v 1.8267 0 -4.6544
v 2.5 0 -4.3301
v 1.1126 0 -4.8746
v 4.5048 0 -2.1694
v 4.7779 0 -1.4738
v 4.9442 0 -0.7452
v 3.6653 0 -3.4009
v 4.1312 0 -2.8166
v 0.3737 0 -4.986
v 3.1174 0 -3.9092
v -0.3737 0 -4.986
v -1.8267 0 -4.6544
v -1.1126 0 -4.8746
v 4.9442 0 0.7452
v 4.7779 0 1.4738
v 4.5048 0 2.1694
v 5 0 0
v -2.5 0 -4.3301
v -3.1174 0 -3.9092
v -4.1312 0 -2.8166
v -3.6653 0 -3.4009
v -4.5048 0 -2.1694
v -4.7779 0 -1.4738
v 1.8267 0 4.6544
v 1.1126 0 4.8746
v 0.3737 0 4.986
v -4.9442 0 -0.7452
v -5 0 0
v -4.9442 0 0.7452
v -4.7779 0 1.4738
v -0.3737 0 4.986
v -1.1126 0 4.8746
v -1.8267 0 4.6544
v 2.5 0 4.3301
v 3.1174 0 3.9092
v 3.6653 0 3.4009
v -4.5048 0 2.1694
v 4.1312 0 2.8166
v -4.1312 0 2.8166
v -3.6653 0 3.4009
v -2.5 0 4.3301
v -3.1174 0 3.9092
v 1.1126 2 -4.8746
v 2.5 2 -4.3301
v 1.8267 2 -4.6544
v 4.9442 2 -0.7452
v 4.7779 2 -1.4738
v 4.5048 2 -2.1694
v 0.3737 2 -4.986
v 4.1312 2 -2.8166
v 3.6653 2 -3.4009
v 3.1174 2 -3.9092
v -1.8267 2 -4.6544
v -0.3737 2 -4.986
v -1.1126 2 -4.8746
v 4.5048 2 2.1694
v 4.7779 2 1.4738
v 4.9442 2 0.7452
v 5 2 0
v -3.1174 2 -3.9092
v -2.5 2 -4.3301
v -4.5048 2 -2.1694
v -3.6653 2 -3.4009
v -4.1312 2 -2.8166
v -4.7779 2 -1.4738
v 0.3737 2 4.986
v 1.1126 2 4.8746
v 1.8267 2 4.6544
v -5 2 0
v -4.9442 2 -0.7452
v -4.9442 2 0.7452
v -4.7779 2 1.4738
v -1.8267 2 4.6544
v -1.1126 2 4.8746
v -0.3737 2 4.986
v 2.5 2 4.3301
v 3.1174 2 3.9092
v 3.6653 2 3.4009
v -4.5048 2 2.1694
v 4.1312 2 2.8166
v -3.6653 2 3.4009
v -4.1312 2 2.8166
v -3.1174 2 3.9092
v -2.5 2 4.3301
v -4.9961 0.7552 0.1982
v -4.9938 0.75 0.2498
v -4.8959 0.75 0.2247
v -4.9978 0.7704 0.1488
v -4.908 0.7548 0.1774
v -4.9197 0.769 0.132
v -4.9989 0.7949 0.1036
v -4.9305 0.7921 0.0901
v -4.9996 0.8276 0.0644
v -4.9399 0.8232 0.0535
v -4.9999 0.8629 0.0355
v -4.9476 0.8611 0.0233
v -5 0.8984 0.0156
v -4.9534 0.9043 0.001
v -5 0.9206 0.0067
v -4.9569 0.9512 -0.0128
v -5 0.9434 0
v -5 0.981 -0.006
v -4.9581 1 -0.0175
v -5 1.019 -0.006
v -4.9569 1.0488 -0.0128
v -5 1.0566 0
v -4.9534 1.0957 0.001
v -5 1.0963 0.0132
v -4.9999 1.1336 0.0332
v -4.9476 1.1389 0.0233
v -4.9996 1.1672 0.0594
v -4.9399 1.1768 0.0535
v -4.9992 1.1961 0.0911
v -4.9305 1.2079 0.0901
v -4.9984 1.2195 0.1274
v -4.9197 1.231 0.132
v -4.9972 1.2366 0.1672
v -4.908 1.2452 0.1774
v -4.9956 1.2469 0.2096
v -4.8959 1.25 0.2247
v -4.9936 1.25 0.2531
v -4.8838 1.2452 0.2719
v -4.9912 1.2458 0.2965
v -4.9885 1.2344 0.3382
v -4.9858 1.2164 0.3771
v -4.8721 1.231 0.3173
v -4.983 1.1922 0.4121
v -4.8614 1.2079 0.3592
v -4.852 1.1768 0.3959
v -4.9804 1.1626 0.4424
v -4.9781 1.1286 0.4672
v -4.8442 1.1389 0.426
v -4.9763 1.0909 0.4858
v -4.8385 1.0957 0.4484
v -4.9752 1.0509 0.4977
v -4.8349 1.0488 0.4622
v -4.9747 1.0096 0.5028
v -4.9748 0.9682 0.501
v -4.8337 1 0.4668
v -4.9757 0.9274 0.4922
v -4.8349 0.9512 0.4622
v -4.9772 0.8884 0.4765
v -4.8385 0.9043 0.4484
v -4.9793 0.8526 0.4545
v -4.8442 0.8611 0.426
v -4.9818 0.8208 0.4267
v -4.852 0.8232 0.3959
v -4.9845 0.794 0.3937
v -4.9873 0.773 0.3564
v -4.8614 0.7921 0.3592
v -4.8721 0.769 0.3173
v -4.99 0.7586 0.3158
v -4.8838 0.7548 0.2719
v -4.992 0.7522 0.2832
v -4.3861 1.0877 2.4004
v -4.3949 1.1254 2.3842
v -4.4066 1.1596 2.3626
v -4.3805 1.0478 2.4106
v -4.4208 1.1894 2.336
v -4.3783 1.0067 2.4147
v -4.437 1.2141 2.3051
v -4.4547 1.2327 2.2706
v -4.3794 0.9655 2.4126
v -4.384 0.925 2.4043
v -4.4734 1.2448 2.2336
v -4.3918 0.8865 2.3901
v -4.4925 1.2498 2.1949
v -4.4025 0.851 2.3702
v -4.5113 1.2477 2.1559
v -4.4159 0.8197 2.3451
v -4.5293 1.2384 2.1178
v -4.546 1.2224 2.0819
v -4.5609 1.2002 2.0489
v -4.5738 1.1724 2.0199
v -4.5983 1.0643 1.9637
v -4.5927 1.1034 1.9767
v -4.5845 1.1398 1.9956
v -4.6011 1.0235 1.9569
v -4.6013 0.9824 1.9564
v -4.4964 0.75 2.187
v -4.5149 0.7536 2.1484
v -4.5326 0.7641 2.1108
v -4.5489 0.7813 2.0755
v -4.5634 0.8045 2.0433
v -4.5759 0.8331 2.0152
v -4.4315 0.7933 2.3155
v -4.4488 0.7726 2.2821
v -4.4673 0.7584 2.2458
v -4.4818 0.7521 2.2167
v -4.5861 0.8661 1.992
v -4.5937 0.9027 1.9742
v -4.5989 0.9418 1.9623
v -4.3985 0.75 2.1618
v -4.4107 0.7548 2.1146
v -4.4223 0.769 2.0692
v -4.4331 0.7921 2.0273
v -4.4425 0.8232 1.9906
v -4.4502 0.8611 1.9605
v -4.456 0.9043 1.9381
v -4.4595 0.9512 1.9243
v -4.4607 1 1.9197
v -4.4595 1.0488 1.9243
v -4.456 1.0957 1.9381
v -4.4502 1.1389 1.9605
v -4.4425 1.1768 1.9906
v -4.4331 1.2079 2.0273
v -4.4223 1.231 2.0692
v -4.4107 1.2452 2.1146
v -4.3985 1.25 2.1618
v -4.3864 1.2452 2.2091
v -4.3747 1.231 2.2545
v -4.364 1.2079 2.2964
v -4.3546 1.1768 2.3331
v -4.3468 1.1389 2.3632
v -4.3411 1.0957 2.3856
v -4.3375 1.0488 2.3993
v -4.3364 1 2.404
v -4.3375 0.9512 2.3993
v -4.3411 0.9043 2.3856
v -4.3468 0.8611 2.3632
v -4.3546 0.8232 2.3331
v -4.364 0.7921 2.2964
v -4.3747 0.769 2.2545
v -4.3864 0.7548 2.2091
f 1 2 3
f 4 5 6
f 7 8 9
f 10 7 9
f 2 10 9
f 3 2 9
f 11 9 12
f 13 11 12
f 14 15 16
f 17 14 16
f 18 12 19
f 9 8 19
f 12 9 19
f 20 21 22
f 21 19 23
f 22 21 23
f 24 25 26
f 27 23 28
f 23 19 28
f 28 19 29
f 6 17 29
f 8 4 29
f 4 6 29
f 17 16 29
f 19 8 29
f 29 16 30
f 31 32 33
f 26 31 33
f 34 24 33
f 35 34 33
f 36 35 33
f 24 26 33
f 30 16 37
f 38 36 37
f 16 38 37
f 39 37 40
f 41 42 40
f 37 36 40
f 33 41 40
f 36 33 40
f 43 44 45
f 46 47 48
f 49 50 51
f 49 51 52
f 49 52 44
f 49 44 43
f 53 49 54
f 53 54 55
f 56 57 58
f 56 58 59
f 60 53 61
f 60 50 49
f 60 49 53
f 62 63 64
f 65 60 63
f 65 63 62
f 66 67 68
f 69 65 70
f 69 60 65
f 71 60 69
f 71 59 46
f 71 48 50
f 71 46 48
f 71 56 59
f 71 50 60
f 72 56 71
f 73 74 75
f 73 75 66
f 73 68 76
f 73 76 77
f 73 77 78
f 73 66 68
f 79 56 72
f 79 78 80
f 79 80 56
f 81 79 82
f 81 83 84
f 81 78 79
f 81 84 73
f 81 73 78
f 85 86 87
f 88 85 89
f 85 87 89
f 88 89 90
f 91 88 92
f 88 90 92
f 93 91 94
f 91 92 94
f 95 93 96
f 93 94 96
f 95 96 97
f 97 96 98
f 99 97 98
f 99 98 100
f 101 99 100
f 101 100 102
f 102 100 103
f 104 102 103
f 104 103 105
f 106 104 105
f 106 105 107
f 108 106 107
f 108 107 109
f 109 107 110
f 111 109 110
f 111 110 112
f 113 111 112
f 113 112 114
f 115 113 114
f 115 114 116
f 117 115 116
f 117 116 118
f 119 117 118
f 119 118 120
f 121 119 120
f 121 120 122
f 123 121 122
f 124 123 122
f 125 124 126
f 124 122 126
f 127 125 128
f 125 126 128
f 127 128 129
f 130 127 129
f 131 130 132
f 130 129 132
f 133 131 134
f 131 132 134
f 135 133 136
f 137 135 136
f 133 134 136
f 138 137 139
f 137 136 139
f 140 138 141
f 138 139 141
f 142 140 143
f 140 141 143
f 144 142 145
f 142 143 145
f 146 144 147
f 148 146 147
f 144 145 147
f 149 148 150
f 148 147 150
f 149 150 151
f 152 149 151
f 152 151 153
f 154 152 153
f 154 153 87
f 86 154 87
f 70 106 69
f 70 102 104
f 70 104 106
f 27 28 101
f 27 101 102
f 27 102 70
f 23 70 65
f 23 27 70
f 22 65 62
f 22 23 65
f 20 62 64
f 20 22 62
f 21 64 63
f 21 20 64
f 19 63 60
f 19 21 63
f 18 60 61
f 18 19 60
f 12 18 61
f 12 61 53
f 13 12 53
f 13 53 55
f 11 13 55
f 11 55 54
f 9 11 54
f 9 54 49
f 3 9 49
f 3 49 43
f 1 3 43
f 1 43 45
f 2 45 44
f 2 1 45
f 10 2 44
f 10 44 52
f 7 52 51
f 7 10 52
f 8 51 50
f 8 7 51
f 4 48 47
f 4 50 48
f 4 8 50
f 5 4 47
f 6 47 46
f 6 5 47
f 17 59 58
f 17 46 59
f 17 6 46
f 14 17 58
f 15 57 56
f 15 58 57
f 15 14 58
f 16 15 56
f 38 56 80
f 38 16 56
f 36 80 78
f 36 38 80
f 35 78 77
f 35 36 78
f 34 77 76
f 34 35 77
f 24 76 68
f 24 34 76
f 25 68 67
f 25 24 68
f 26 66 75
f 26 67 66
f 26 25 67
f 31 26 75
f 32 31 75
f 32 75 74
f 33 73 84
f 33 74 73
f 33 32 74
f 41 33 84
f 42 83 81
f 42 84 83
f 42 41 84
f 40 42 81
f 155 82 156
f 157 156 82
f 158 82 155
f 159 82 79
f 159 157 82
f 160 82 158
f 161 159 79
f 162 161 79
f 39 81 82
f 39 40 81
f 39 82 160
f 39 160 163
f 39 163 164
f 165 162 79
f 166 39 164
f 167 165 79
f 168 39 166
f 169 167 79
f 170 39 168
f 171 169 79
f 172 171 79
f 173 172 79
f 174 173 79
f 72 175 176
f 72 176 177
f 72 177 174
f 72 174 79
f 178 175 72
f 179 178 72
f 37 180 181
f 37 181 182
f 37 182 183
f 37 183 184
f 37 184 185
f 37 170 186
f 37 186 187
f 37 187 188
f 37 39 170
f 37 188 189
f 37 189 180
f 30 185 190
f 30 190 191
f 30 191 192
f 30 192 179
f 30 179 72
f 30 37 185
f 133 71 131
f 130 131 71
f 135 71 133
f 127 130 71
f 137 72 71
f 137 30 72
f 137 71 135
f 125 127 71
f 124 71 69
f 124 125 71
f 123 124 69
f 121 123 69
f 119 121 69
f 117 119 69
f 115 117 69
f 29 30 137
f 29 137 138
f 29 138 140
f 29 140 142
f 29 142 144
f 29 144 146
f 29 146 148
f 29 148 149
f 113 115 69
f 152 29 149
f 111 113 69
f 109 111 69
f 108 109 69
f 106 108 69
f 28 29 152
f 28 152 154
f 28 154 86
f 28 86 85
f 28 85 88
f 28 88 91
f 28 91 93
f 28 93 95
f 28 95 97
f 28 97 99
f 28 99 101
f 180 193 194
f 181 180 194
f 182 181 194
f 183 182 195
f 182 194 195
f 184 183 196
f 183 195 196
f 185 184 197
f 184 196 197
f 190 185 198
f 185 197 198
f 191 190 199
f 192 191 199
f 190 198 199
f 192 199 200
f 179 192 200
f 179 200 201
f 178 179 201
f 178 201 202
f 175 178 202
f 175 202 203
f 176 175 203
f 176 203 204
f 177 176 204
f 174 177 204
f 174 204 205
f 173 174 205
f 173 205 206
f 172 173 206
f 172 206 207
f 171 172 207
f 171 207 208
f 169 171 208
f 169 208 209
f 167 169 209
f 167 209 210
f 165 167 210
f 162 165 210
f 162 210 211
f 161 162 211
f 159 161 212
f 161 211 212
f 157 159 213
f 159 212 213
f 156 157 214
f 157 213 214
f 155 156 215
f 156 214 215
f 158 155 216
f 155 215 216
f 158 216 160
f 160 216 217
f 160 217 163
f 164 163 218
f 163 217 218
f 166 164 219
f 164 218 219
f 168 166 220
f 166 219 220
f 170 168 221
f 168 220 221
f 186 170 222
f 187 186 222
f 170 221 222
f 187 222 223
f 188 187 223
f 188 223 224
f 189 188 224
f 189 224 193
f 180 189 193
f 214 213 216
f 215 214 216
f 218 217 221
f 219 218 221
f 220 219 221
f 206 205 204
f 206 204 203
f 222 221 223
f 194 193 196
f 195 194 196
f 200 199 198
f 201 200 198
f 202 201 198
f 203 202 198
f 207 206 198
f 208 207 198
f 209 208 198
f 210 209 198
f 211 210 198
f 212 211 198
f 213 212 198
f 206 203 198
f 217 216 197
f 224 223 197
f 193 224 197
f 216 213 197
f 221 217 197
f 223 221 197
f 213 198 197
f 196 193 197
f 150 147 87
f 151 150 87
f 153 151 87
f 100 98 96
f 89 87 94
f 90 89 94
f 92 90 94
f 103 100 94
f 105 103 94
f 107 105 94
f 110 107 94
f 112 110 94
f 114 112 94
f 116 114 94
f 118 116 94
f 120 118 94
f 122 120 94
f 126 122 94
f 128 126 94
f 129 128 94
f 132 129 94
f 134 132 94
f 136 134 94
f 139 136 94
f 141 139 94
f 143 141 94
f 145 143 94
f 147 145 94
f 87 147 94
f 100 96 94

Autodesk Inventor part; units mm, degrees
ref_plane "YZ Plane" through (0, 0, 0) normal (1, 0, 0) x (0, 1, 0)
ref_plane "XZ Plane" through (0, 0, 0) normal (0, 1, 0) x (-1, 0, 0)
ref_plane "XY Plane" through (0, 0, 0) normal (0, 0, 1) x (1, 0, 0)
sketch "スケッチ1" plane through (0, 0, 0) normal (0, 1, 0) x (-1, 0, 0)
  circle A0 centre (0, 0) radius 5
  dimension "d0" = 10
extrude "押し出し1" add sketch "スケッチ1" along normal blind 2
ref_plane "作業平面1" through (-5.2036, 2.166, -0.9656) normal (0.9686, 0, -0.2487) x (0, -1, 0)
sketch "スケッチ2" plane through (-5.2036, 2.166, -0.9656) normal (0.9686, 0, -0.2487) x (0, -1, 0)
  line L0 (0.166, 2.7706) -> (0.166, -7.2294) projected
  line L1 (2.166, 2.7706) -> (2.166, -7.2294) projected
  line L2 (2.166, -7.2294) -> (0.166, -7.2294) projected
  line L3 (2.166, 2.7706) -> (0.166, 2.7706) projected
  circle A0 centre (1.166, -1.2294) radius 0.25
  circle A1 centre (1.166, -3.2294) radius 0.25
  point P0 (2.166, -2.2294)
  dimension "d3" = 2
  dimension "d4" = 1
  dimension "d5" = 4
  dimension "d6" = 1
  dimension "d7" = 0.5
  dimension "d8" = 0.5
extrude "押し出し2" cut sketch "スケッチ2" against normal blind 2 contours A0 | A1
properties part number "mini vibrator"
